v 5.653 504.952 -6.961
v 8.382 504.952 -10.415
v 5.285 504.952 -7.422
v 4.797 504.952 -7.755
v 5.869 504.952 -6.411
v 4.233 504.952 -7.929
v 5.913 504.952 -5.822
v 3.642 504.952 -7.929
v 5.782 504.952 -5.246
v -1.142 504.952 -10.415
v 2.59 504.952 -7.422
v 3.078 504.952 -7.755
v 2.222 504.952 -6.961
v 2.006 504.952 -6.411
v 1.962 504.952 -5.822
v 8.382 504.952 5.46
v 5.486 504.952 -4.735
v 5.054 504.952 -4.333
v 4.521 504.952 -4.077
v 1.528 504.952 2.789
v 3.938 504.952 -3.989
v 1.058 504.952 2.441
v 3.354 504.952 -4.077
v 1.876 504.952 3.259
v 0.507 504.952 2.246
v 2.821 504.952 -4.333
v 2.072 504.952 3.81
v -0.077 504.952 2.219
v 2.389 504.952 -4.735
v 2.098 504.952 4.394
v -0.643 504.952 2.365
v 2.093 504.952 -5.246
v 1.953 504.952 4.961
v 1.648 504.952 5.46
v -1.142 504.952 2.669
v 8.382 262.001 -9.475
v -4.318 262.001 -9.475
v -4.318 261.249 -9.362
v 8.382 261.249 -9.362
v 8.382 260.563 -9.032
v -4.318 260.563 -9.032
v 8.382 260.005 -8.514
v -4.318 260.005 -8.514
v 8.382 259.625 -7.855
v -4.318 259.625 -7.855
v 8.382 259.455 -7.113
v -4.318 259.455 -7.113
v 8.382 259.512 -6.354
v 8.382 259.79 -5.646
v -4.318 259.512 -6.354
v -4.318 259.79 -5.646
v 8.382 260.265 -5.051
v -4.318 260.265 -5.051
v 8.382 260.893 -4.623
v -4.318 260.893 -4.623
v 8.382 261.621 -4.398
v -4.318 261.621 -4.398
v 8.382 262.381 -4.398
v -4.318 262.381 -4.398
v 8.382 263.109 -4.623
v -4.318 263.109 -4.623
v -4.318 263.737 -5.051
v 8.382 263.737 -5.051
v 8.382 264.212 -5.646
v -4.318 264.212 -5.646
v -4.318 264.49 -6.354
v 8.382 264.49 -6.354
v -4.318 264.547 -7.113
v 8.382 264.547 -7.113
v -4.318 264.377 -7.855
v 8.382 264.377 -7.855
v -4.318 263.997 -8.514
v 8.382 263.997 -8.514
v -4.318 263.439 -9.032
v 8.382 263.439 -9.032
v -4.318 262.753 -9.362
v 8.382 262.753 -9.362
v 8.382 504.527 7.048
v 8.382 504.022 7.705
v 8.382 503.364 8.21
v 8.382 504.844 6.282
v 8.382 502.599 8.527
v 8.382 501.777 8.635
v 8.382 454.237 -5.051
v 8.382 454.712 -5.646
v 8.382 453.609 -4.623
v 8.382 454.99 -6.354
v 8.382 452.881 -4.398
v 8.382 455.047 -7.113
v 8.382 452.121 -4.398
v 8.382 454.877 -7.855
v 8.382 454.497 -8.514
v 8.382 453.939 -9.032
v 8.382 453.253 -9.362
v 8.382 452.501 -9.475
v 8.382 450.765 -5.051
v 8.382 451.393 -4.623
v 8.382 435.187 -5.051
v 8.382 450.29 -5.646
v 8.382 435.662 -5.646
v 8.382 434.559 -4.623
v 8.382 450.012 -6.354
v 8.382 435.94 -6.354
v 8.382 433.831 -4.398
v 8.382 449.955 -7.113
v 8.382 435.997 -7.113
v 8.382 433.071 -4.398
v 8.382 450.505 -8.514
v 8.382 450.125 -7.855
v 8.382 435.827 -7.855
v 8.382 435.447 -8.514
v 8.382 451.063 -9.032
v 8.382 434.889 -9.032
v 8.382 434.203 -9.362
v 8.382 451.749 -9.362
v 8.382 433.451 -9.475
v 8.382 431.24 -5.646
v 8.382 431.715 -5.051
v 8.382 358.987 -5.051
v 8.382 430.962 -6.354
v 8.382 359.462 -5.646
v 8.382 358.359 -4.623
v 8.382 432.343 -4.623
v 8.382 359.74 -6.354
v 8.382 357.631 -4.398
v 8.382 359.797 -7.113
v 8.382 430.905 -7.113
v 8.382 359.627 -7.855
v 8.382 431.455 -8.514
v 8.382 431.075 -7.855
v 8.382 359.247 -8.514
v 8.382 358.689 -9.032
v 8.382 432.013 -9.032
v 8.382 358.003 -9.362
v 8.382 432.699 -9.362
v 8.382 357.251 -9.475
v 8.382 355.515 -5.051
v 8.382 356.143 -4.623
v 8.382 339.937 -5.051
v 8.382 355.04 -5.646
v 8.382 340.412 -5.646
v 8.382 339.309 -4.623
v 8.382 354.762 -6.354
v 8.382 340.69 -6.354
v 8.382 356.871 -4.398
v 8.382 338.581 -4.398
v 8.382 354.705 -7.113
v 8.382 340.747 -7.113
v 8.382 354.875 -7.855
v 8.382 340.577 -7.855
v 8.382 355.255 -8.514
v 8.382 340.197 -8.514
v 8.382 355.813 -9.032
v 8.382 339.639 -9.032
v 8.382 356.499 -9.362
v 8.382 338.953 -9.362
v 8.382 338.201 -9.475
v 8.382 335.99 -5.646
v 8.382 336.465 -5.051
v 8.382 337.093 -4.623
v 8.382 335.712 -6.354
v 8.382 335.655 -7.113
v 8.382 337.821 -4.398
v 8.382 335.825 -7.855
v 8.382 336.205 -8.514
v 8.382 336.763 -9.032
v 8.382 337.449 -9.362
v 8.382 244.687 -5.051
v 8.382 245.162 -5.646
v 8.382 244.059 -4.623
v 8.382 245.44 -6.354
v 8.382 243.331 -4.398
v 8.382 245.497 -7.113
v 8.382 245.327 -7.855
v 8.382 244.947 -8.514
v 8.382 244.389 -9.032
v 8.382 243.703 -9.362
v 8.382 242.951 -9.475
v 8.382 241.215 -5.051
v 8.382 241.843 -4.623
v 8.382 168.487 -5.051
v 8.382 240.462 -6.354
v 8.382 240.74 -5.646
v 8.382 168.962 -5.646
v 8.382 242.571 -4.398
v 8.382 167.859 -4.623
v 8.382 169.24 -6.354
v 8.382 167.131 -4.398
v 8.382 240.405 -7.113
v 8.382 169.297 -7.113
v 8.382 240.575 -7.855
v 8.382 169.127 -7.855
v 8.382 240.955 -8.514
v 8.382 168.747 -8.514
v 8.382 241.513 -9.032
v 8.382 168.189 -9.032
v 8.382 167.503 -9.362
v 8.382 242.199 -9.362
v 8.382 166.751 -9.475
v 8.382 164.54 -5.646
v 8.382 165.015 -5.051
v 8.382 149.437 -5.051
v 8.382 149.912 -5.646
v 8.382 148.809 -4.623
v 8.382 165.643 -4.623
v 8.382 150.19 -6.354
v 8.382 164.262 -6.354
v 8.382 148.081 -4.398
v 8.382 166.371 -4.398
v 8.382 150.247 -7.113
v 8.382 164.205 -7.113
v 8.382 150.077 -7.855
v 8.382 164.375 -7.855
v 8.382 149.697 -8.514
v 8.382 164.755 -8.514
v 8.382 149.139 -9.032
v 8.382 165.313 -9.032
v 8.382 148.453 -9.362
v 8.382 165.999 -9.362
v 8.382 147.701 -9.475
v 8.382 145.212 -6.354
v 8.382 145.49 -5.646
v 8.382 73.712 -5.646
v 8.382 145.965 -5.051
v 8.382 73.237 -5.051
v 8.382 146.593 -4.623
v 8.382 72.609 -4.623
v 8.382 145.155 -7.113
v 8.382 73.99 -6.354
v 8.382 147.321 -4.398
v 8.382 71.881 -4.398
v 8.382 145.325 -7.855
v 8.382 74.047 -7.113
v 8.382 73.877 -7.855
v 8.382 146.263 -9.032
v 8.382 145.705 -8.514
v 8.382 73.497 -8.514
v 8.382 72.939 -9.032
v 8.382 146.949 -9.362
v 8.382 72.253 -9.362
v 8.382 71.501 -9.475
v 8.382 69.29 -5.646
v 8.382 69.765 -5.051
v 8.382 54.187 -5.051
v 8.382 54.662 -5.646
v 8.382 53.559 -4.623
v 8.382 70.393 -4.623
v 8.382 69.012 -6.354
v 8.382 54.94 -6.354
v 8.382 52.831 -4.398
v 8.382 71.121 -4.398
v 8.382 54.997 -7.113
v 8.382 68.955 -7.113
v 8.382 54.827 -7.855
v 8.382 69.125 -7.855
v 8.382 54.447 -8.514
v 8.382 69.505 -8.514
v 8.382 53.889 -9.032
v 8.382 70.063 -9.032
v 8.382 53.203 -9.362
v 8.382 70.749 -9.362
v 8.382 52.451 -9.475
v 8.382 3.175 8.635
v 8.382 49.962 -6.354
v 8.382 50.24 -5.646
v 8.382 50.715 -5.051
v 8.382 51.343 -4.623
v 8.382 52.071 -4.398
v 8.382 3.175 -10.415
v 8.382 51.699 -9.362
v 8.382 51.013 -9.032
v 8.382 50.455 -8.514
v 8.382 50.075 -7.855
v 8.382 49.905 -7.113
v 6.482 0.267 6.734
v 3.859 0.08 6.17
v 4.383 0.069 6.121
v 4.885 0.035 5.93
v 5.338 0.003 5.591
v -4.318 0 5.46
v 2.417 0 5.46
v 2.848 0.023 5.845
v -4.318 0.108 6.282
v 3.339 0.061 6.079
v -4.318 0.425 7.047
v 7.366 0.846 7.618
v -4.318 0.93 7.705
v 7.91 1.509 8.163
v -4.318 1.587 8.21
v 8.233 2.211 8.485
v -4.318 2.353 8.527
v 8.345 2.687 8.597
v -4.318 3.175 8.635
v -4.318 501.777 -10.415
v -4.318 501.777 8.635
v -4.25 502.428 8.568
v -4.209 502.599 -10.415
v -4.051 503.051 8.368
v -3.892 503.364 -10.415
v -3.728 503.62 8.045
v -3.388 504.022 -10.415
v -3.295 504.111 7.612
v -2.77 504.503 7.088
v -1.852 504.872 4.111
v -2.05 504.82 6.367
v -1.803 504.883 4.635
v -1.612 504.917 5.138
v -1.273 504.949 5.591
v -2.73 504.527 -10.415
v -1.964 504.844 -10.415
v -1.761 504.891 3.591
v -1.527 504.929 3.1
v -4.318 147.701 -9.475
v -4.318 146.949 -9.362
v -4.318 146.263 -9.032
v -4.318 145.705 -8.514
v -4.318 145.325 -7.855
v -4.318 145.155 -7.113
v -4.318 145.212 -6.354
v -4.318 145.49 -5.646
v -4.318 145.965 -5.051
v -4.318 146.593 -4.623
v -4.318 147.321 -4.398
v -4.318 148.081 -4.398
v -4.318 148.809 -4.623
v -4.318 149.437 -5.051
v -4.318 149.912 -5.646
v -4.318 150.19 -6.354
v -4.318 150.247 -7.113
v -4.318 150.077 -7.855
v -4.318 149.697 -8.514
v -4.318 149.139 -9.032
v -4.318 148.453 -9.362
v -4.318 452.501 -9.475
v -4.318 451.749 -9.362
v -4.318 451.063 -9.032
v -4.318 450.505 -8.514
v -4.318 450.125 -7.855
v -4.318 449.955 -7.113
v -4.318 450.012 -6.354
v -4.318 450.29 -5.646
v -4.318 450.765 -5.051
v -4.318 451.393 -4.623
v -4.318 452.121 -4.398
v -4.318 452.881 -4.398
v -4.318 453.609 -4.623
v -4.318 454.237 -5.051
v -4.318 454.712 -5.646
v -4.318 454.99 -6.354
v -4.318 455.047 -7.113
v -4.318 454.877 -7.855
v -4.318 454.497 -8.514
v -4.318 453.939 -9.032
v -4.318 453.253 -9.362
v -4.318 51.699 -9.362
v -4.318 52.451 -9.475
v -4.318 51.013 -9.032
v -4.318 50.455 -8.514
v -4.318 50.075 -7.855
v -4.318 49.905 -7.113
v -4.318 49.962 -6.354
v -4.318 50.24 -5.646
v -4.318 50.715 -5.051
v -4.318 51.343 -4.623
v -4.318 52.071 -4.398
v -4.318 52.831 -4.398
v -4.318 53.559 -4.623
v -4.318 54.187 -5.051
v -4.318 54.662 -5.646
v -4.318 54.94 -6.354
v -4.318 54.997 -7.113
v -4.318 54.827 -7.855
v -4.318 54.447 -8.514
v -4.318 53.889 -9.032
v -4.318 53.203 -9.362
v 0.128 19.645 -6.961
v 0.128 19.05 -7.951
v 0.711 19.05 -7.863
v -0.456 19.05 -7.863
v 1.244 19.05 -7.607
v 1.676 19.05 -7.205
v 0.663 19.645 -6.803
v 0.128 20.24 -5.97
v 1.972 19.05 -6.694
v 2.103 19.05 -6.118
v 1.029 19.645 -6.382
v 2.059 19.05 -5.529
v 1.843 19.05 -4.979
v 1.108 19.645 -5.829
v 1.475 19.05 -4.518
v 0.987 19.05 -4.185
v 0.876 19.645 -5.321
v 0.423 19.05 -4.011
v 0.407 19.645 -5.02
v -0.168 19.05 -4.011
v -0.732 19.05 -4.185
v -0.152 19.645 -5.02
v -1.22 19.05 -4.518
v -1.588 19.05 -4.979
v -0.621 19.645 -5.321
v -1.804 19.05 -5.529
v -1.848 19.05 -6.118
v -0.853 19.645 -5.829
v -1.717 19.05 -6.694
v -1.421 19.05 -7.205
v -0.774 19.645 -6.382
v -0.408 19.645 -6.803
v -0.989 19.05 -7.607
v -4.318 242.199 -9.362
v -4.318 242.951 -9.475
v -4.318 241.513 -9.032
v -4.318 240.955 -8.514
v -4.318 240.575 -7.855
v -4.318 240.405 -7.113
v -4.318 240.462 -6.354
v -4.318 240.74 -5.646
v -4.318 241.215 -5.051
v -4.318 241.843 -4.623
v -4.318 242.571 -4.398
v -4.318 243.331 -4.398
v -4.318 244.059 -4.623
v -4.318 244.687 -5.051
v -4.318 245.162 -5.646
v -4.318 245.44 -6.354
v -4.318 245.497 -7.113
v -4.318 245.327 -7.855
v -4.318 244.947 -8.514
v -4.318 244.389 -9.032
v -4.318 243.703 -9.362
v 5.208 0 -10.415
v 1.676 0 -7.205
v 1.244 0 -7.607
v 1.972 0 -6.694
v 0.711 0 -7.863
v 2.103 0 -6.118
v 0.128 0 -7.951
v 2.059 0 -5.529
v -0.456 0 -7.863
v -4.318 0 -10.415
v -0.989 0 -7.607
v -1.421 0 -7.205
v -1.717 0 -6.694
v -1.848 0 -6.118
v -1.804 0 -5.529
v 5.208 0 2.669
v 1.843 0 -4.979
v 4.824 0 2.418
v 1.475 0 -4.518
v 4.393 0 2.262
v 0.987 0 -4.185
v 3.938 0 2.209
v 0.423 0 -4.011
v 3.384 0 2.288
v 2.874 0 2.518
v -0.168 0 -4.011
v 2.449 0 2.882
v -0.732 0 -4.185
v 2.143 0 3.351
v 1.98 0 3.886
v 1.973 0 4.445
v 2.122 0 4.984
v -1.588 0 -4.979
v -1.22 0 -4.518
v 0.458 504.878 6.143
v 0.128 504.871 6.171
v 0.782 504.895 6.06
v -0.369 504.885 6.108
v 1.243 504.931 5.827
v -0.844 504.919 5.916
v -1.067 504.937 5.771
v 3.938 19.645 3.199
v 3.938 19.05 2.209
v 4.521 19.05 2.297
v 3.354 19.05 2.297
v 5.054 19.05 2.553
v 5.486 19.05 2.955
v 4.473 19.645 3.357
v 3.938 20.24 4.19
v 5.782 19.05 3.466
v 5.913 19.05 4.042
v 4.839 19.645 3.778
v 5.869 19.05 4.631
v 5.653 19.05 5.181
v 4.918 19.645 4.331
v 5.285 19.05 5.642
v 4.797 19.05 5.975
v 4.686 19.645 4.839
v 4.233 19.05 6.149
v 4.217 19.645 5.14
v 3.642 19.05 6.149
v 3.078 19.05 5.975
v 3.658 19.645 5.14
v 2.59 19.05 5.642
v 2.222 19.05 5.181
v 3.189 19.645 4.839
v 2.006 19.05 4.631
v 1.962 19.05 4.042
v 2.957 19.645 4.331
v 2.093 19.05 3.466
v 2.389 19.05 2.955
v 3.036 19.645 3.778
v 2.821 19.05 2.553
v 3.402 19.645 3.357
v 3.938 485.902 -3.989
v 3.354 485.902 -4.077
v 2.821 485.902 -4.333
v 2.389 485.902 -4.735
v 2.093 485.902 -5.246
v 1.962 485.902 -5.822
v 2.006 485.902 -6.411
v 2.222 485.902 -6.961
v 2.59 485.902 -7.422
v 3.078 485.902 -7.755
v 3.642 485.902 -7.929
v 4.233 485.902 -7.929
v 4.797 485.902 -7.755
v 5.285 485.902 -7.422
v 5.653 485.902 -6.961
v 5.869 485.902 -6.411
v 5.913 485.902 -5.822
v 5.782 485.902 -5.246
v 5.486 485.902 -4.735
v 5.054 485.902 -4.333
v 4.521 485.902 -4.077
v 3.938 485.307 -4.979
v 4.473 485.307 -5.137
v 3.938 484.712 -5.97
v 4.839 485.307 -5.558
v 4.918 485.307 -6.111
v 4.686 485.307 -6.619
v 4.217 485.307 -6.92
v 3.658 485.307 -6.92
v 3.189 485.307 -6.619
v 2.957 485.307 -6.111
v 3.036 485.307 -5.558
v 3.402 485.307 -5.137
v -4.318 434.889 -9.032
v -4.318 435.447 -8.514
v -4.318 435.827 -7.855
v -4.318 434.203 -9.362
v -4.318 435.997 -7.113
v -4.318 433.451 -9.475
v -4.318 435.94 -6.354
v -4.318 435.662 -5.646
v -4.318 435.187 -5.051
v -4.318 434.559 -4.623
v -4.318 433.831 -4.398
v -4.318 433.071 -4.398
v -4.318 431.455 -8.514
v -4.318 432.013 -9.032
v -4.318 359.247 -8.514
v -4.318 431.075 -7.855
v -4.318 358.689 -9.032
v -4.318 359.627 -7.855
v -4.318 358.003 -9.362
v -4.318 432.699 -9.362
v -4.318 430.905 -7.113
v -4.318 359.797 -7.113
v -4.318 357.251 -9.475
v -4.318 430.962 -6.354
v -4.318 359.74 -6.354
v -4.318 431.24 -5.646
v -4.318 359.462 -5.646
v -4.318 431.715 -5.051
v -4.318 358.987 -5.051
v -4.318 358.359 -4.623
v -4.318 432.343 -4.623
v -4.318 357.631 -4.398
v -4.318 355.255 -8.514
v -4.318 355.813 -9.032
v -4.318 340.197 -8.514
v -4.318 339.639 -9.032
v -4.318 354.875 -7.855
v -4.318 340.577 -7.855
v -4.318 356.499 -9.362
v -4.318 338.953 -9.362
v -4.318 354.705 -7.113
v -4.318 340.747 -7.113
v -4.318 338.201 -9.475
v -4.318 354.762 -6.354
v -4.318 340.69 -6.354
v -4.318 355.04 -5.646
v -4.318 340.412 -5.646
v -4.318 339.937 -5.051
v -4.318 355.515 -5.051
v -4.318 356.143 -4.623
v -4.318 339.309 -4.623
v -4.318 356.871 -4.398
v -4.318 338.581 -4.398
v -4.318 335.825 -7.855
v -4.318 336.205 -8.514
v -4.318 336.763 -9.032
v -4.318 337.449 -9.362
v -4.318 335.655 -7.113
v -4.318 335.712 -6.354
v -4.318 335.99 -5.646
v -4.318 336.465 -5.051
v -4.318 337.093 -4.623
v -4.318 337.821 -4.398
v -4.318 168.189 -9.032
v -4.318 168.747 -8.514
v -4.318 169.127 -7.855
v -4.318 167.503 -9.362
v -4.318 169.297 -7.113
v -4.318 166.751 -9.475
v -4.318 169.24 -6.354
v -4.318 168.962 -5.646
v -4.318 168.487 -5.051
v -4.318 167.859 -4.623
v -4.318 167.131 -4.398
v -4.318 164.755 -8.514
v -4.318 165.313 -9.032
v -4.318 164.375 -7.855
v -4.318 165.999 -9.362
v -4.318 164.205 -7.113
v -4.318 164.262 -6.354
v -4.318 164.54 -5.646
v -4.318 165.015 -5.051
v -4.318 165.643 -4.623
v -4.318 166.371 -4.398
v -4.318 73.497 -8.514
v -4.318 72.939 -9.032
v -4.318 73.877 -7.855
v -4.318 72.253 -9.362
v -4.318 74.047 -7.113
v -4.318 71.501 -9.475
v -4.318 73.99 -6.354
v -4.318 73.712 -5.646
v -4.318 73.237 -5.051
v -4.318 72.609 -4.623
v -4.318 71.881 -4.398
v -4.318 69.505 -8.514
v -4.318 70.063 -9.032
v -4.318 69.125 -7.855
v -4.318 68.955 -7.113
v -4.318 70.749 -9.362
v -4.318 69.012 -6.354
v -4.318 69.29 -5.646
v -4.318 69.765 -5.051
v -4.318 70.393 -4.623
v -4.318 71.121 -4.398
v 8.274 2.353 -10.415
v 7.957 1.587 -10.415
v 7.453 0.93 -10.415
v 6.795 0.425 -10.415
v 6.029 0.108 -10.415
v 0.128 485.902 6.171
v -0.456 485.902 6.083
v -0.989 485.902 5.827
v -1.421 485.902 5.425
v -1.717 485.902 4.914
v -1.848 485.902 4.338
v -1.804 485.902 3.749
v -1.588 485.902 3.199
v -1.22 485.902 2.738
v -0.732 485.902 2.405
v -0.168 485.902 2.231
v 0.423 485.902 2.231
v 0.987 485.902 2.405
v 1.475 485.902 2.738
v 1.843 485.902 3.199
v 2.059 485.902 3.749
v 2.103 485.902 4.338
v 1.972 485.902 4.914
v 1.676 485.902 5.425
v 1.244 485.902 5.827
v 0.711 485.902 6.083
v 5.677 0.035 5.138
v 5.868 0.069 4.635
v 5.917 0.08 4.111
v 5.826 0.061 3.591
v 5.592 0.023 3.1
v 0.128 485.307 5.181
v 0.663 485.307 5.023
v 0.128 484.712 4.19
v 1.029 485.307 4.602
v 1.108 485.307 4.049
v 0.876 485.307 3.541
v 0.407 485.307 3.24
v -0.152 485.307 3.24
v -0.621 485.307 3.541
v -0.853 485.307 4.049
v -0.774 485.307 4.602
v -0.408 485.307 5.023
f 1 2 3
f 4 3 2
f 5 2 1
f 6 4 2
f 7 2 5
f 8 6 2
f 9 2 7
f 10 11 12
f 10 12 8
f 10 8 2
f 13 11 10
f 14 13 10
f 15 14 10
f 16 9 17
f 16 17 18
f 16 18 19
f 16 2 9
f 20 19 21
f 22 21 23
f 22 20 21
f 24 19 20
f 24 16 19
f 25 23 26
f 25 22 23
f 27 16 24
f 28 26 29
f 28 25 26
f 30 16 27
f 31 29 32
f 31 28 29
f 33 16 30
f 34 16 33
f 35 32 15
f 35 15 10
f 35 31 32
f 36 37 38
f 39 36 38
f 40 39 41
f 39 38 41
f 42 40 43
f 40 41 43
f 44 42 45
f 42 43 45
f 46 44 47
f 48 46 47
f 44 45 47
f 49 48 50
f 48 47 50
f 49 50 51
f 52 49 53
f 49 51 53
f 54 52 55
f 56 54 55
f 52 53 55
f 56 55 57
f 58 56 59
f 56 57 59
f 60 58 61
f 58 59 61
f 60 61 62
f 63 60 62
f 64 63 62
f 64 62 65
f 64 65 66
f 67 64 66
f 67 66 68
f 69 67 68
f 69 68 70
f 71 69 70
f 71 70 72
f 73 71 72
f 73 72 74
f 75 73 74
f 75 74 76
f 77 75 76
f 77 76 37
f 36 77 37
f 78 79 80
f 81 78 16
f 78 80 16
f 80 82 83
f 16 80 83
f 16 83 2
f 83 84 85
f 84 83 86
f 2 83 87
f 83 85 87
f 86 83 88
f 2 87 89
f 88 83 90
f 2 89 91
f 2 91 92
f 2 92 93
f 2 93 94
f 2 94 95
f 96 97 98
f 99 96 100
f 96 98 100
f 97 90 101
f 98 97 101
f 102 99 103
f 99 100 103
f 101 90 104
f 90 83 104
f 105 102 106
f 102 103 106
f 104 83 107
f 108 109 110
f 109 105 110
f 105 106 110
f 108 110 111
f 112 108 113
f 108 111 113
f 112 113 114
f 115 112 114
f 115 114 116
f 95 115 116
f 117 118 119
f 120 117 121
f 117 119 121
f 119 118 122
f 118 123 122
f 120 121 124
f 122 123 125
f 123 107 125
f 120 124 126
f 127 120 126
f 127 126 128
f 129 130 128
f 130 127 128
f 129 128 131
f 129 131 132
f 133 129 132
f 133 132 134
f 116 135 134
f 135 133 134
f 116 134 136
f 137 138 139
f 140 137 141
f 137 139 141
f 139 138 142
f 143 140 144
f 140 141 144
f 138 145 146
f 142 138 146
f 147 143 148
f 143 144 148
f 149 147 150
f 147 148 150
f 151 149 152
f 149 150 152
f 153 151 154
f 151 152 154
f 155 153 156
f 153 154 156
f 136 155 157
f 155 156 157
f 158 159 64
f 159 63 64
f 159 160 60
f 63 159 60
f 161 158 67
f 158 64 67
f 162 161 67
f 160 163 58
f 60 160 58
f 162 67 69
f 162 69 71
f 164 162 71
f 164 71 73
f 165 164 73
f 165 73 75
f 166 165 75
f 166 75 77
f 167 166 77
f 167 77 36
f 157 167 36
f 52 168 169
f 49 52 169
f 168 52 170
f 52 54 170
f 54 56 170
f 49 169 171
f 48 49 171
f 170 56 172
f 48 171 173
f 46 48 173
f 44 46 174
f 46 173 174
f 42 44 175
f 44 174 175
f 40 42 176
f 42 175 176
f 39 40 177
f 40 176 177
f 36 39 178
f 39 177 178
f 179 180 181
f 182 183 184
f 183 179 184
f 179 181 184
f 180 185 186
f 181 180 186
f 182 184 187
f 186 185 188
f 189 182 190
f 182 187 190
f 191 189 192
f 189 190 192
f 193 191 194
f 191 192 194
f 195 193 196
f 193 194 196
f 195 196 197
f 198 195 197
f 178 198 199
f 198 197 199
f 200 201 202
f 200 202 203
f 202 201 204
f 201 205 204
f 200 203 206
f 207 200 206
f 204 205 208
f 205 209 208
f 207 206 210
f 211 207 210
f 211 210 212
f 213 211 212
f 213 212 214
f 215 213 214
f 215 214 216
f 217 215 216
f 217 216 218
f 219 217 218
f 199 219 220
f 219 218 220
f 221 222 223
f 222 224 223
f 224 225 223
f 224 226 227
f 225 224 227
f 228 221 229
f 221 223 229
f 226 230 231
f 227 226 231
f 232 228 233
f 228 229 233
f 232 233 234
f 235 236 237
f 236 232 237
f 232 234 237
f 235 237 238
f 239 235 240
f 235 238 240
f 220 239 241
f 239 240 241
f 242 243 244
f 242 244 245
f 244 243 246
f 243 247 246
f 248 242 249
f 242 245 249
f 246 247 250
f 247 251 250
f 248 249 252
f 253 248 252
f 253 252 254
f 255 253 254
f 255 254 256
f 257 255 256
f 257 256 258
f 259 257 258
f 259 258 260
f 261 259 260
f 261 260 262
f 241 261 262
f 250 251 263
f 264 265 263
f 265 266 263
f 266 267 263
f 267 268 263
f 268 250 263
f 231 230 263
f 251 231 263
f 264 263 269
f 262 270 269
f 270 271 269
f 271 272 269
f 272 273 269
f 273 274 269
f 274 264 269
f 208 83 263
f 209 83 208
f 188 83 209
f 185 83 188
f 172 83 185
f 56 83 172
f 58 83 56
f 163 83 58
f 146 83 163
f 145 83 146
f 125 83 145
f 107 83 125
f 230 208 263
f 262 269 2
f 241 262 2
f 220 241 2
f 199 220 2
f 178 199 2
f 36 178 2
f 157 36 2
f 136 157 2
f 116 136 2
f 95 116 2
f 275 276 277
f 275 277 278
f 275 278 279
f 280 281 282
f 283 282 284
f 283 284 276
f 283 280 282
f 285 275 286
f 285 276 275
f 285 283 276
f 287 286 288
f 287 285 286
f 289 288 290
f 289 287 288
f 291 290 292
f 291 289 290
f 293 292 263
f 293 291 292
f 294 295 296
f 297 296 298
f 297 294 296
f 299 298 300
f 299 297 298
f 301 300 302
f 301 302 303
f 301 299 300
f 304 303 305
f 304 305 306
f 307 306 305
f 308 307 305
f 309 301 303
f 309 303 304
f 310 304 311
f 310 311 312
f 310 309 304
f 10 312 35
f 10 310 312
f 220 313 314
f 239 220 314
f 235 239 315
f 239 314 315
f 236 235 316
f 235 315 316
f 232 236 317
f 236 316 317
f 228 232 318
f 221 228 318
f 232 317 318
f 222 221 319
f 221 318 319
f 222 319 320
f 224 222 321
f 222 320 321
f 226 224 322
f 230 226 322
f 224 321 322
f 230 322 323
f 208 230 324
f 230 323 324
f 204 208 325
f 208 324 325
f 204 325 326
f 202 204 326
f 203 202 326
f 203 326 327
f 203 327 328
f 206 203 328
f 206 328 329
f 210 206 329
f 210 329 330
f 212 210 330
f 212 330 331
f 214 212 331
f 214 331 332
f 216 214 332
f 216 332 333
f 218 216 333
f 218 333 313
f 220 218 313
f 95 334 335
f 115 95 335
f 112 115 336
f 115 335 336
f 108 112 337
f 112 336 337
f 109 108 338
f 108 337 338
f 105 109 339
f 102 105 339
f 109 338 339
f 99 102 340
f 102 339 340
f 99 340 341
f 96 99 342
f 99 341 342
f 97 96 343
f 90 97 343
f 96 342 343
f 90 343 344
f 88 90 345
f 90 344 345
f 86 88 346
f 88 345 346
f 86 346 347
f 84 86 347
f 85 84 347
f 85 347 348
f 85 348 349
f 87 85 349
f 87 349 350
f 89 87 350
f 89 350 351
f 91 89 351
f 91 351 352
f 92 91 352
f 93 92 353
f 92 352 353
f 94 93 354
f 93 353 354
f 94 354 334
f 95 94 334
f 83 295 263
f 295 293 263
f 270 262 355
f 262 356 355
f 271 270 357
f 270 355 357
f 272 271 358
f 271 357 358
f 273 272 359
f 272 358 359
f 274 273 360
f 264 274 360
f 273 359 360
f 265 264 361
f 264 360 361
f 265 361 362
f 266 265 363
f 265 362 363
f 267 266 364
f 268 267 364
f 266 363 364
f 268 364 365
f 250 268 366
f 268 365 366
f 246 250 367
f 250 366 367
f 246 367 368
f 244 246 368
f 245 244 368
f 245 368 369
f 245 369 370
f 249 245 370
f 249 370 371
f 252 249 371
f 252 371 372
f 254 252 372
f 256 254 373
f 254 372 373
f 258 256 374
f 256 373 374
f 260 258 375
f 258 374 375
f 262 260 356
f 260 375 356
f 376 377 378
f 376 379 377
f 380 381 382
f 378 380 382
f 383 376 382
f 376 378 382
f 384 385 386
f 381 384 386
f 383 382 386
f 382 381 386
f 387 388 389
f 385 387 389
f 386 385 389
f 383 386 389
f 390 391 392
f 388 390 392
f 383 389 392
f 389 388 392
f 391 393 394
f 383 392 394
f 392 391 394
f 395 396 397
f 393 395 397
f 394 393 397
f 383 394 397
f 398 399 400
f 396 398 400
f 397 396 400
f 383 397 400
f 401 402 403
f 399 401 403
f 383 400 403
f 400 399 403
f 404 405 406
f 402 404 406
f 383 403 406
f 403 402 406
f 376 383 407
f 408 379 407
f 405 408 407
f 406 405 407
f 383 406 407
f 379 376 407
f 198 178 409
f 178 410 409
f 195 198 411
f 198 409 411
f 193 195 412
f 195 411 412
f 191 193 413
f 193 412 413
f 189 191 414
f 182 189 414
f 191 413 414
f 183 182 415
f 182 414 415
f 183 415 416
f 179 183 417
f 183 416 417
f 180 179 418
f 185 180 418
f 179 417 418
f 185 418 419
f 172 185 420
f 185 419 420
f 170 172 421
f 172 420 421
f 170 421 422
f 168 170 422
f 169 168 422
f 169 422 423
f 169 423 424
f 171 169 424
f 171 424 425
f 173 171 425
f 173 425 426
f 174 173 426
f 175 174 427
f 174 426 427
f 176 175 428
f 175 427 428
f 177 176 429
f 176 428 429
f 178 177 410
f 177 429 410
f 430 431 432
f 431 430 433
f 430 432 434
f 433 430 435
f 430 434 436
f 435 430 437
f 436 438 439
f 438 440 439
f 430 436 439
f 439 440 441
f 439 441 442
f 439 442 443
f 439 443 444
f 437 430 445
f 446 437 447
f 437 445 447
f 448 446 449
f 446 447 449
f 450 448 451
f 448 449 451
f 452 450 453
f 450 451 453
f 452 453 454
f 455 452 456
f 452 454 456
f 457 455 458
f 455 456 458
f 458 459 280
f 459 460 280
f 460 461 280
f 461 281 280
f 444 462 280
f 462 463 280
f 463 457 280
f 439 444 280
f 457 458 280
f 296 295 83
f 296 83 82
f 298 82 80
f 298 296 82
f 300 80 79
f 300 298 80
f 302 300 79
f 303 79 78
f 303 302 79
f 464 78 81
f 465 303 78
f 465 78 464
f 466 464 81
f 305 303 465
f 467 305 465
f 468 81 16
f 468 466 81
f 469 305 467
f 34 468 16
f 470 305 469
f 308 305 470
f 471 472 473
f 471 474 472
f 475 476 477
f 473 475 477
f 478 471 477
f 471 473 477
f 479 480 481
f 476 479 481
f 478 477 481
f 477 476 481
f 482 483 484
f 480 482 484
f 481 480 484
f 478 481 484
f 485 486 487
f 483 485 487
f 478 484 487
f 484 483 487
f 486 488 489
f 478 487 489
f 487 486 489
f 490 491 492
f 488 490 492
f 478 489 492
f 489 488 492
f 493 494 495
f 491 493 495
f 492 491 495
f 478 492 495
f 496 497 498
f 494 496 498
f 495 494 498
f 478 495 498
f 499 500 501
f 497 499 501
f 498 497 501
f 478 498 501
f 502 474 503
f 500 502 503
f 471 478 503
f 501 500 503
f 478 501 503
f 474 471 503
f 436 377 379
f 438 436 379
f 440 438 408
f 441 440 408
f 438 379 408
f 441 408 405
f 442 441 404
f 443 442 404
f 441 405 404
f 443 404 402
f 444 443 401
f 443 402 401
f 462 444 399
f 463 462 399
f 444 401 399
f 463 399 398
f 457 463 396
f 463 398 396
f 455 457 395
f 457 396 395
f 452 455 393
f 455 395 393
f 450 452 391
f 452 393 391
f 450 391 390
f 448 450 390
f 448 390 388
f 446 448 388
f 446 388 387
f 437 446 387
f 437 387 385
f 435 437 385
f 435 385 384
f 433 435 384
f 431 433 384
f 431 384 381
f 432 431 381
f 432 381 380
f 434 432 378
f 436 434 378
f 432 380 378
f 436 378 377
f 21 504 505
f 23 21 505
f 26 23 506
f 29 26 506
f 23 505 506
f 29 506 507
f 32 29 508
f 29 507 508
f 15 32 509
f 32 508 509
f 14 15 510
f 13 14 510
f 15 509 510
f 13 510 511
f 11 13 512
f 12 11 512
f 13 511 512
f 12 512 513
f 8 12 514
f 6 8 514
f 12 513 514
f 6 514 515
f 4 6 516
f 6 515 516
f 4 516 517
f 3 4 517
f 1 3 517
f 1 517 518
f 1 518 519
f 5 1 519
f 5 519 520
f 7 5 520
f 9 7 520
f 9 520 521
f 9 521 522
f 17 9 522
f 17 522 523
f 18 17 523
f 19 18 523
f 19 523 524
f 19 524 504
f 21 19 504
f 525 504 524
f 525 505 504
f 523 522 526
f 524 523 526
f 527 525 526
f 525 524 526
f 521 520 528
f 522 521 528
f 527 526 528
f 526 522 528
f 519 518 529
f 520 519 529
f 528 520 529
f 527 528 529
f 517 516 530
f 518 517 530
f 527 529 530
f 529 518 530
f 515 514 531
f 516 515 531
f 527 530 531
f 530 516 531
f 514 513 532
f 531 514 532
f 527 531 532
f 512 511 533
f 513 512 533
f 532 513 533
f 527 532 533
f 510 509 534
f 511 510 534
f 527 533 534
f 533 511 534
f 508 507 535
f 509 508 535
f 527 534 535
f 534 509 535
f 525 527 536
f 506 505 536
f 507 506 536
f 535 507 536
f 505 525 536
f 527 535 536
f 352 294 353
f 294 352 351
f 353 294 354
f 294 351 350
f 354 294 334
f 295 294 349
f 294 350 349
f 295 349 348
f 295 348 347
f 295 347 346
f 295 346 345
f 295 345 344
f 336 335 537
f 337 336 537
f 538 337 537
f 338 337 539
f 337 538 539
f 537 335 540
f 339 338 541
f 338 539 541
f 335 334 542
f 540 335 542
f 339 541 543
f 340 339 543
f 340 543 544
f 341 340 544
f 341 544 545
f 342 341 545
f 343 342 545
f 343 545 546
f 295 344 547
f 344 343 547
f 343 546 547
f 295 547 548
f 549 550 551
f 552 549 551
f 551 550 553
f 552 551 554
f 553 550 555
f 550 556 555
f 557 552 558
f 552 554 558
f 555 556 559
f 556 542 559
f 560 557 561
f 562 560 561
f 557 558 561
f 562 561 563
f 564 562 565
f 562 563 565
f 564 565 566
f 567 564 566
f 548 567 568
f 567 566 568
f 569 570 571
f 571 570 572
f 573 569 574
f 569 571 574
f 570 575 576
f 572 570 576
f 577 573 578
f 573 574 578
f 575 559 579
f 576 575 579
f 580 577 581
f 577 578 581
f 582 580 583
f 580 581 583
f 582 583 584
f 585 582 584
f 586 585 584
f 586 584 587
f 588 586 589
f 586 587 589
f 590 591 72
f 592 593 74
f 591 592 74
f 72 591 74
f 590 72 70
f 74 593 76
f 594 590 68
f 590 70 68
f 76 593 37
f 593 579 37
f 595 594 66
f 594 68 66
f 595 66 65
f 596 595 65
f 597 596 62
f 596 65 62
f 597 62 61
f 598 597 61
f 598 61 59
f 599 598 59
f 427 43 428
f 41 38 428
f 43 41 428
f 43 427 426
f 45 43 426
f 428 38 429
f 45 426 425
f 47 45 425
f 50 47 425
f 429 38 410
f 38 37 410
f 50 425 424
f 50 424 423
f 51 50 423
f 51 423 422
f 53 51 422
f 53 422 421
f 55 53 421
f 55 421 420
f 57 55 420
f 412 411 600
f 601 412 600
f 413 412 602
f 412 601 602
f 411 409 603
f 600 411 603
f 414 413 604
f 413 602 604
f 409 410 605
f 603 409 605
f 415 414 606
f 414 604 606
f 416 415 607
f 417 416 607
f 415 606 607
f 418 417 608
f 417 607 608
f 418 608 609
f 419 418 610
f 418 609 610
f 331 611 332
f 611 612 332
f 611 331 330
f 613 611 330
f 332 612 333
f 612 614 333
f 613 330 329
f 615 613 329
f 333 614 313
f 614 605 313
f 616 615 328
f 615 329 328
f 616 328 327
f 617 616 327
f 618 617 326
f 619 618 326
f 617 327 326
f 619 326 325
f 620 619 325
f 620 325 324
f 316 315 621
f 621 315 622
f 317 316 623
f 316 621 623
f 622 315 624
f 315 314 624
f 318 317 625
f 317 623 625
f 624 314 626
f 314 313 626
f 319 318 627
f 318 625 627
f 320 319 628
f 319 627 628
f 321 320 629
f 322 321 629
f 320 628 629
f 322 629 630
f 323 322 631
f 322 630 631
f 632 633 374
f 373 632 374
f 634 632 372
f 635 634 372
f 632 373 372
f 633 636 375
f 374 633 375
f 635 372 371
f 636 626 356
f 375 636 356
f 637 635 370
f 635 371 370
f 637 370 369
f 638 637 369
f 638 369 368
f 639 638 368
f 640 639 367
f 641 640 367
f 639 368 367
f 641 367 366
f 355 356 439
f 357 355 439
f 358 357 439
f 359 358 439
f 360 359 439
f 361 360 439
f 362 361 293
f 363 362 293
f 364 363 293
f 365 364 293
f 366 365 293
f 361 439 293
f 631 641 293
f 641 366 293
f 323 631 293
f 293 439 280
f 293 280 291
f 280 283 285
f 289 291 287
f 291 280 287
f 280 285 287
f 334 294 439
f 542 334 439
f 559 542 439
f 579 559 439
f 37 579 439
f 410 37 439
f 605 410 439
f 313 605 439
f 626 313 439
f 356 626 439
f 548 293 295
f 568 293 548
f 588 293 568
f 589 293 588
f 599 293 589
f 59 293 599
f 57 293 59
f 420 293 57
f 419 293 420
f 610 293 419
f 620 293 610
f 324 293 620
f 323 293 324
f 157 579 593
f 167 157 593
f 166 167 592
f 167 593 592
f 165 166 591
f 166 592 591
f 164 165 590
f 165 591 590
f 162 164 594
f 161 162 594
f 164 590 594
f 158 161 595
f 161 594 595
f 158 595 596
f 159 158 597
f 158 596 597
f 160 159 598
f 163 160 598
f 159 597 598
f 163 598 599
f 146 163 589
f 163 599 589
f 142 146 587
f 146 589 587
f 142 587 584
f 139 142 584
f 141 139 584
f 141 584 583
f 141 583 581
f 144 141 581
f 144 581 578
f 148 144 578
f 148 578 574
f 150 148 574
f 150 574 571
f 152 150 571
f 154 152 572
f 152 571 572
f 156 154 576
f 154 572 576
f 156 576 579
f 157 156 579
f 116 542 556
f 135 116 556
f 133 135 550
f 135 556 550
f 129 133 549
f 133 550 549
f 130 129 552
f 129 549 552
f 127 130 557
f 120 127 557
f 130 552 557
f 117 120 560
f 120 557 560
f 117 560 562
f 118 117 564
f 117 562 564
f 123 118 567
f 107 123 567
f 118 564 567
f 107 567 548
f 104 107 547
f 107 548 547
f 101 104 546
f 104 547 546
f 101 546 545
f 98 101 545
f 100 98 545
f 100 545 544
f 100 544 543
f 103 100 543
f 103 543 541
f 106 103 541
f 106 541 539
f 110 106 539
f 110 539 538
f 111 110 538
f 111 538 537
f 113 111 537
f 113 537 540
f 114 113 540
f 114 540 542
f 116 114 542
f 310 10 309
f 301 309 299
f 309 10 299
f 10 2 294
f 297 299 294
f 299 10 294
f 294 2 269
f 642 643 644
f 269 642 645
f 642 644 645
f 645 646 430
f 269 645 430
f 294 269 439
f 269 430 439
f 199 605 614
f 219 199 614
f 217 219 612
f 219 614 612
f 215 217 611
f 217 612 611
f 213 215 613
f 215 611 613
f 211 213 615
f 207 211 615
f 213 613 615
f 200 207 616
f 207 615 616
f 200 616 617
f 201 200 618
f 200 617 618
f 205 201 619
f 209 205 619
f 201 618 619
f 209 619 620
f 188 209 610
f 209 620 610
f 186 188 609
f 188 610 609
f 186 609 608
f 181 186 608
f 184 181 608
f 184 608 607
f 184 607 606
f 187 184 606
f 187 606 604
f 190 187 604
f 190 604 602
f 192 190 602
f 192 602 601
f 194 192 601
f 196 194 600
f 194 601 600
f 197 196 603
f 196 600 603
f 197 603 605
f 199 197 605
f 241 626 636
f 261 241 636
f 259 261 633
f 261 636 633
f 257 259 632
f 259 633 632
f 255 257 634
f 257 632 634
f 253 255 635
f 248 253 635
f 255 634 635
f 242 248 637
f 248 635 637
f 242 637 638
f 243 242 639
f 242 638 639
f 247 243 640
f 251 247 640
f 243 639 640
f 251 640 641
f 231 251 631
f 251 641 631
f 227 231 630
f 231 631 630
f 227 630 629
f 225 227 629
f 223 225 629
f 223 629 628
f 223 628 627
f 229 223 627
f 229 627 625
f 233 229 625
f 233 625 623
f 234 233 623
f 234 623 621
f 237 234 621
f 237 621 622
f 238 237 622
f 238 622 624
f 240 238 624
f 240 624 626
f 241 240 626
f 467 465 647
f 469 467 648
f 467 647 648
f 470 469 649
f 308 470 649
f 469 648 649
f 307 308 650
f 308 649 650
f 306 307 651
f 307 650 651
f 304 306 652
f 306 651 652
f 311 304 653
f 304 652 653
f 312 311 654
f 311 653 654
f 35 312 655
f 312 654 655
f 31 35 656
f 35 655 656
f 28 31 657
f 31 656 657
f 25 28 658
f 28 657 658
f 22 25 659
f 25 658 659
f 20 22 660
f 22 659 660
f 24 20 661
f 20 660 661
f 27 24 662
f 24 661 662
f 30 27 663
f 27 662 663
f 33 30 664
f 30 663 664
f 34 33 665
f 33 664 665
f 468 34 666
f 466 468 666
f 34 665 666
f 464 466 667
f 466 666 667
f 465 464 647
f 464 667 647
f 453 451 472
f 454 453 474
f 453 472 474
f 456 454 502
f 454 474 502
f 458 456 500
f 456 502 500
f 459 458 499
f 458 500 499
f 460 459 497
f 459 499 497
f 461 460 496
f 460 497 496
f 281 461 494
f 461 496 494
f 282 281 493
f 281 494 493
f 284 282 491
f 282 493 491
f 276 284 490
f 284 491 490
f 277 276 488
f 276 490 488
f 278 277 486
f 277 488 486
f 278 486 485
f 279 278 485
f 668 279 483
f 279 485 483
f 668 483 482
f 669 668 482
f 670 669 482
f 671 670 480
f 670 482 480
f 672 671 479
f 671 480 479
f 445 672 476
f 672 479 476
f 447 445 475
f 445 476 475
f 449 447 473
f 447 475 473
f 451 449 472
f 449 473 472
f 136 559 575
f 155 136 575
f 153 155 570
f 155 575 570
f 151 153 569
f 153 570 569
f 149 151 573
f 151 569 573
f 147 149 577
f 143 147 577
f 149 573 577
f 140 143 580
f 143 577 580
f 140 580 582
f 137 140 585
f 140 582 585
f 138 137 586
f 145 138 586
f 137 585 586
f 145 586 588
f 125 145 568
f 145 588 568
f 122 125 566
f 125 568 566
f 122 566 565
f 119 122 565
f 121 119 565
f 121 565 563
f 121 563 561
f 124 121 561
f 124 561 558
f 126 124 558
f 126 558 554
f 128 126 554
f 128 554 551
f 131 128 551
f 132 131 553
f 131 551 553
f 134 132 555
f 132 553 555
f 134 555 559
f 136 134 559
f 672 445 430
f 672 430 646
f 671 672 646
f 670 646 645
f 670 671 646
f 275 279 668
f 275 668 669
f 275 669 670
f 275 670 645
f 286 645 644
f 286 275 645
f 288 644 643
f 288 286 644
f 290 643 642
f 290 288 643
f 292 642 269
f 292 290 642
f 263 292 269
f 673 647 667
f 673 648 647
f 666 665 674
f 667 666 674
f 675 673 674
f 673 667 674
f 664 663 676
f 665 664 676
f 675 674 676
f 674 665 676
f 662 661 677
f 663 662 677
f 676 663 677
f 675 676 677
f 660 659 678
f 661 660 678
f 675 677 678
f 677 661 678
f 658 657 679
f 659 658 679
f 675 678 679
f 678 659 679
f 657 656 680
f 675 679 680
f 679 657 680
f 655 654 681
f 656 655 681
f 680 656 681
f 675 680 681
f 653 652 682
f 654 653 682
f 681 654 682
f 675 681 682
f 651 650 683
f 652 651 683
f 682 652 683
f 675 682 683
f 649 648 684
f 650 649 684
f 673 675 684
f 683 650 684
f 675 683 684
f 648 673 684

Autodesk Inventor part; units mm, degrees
ref_plane "YZ Plane" through (0, 0, 0) normal (1, 0, 0) x (0, 1, 0)
ref_plane "XZ Plane" through (0, 0, 0) normal (0, 1, 0) x (-1, 0, 0)
ref_plane "XY Plane" through (0, 0, 0) normal (0, 0, 1) x (1, 0, 0)
sketch "Sketch1" plane through (0, 0, 0) normal (0, 1, 0) x (-1, 0, 0)
  line L0 (4.3175, 8.635) -> (-8.3825, 8.635)
  line L1 (-8.3825, 8.635) -> (-8.3825, -10.415)
  line L2 (-8.3825, -10.415) -> (4.3175, -10.415)
  line L3 (4.3175, -10.415) -> (4.3175, 8.635)
  point P0 (0, 0)
  dimension "d0" = 19.05
  dimension "d1" = 12.7
extrude "Extrusion1" add sketch "Sketch1" along normal blind 504.952
sketch "Sketch2" plane through (8.3825, 0, 8.635) normal (1, 0, 0) x (0, 0, -1)
  line L0 (19.05, 0) -> (19.05, 504.952) projected
  line L1 (15.5575, 452.501) -> (15.5575, 433.451) construction
  line L2 (15.5575, 442.976) -> (19.05, 442.976) construction
  line L3 (15.5575, 357.251) -> (15.5575, 338.201) construction
  line L4 (15.5575, 347.726) -> (19.05, 347.726) construction
  line L5 (15.5575, 262.001) -> (15.5575, 242.951) construction
  line L6 (15.5575, 252.476) -> (19.05, 252.476) construction
  line L7 (15.5575, 166.751) -> (15.5575, 147.701) construction
  line L8 (15.5575, 157.226) -> (19.05, 157.226) construction
  line L9 (15.5575, 71.501) -> (15.5575, 52.451) construction
  line L10 (15.5575, 61.976) -> (19.05, 61.976) construction
  point P0 (8.635, 0)
  dimension "d4" = 19.05
  dimension "d5" = 3.4925
  dimension "d8" = 95.25
hole "Hole1" at (8.3825, 452.501, -6.9225) at (8.3825, 433.451, -6.9225) at (8.3825, 357.251, -6.9225) at (8.3825, 338.201, -6.9225) at (8.3825, 262.001, -6.9225) at (8.3825, 242.951, -6.9225) at (8.3825, 166.751, -6.9225) at (8.3825, 147.701, -6.9225) at (8.3825, 71.501, -6.9225) at (8.3825, 52.451, -6.9225) direction (-1, 0, 0) diameter 5.1054 end up to surface clearance for "Socket Head Cap Screw" size "#10" standard "Ansi Unified Screw Threads"
sketch "Sketch3" plane through (0, 504.952, 0) normal (0, 1, 0) x (1, 0, 0)
  circle A0 centre (3.9375, 5.97) radius 2.413 construction
  circle A1 centre (0.1275, -4.19) radius 2.413 construction
  line L0 (-4.3175, -8.635) -> (8.3825, -8.635) construction
  line L1 (-4.3175, 10.415) -> (-4.3175, -8.635) construction
  line L2 (8.3825, -8.635) -> (8.3825, 10.415) construction
  line L3 (8.3825, 10.415) -> (-4.3175, 10.415) construction
  point P0 (0, 0)
  dimension "d20" = 4.826
  dimension "d21" = 4.445
  dimension "d22" = 4.445
  dimension "d23" = 4.445
  dimension "d24" = 4.445
hole "Hole2" at (0.1275, 504.952, 4.19) at (3.9375, 504.952, -5.97) direction (0, -1, 0) diameter 3.9624 depth 19.05 tip angle 118 thread size "10-32 UNF" class "2B" standard "ANSI Unified Screw Threads"
sketch "Sketch4" plane through (0, 0, 0) normal (0, -1, 0) x (1, 0, 0)
  line L0 (8.3825, -10.415) -> (-4.3175, -10.415) projected
  line L1 (-4.3175, -10.415) -> (-4.3175, 8.635) projected
  line L2 (8.3825, 8.635) -> (8.3825, -10.415) projected
  line L3 (-4.3175, 8.635) -> (8.3825, 8.635) projected
  point P0 (0, 0)
  point P1 (0.1275, -5.97)
  point P2 (3.9375, 4.19)
  dimension "d32" = 4.445
  dimension "d33" = 4.445
  dimension "d34" = 4.445
  dimension "d35" = 4.445
hole "Hole3" at (0.1275, 0, -5.97) at (3.9375, 0, 4.19) direction (0, 1, 0) diameter 3.9624 depth 19.05 tip angle 118 thread size "10-32 UNF" class "2B" standard "ANSI Unified Screw Threads"
fillet "Fillet1" radius 3.175 4 edges at (-4.3175, 504.952, -0.89) (8.3825, 0, -0.89) (2.0325, 0, 8.635) (2.0325, 504.952, 8.635)
equation "\"d22\" = d21"
equation "\"d23\" = d21"
equation "\"d24\" = d21"
equation "\"d32\" = d21"
equation "\"d33\" = d21"
equation "\"d34\" = d21"
equation "\"d35\" = d21"
properties part number "Winch_Plate_Rear" material "Aluminum 6061"
